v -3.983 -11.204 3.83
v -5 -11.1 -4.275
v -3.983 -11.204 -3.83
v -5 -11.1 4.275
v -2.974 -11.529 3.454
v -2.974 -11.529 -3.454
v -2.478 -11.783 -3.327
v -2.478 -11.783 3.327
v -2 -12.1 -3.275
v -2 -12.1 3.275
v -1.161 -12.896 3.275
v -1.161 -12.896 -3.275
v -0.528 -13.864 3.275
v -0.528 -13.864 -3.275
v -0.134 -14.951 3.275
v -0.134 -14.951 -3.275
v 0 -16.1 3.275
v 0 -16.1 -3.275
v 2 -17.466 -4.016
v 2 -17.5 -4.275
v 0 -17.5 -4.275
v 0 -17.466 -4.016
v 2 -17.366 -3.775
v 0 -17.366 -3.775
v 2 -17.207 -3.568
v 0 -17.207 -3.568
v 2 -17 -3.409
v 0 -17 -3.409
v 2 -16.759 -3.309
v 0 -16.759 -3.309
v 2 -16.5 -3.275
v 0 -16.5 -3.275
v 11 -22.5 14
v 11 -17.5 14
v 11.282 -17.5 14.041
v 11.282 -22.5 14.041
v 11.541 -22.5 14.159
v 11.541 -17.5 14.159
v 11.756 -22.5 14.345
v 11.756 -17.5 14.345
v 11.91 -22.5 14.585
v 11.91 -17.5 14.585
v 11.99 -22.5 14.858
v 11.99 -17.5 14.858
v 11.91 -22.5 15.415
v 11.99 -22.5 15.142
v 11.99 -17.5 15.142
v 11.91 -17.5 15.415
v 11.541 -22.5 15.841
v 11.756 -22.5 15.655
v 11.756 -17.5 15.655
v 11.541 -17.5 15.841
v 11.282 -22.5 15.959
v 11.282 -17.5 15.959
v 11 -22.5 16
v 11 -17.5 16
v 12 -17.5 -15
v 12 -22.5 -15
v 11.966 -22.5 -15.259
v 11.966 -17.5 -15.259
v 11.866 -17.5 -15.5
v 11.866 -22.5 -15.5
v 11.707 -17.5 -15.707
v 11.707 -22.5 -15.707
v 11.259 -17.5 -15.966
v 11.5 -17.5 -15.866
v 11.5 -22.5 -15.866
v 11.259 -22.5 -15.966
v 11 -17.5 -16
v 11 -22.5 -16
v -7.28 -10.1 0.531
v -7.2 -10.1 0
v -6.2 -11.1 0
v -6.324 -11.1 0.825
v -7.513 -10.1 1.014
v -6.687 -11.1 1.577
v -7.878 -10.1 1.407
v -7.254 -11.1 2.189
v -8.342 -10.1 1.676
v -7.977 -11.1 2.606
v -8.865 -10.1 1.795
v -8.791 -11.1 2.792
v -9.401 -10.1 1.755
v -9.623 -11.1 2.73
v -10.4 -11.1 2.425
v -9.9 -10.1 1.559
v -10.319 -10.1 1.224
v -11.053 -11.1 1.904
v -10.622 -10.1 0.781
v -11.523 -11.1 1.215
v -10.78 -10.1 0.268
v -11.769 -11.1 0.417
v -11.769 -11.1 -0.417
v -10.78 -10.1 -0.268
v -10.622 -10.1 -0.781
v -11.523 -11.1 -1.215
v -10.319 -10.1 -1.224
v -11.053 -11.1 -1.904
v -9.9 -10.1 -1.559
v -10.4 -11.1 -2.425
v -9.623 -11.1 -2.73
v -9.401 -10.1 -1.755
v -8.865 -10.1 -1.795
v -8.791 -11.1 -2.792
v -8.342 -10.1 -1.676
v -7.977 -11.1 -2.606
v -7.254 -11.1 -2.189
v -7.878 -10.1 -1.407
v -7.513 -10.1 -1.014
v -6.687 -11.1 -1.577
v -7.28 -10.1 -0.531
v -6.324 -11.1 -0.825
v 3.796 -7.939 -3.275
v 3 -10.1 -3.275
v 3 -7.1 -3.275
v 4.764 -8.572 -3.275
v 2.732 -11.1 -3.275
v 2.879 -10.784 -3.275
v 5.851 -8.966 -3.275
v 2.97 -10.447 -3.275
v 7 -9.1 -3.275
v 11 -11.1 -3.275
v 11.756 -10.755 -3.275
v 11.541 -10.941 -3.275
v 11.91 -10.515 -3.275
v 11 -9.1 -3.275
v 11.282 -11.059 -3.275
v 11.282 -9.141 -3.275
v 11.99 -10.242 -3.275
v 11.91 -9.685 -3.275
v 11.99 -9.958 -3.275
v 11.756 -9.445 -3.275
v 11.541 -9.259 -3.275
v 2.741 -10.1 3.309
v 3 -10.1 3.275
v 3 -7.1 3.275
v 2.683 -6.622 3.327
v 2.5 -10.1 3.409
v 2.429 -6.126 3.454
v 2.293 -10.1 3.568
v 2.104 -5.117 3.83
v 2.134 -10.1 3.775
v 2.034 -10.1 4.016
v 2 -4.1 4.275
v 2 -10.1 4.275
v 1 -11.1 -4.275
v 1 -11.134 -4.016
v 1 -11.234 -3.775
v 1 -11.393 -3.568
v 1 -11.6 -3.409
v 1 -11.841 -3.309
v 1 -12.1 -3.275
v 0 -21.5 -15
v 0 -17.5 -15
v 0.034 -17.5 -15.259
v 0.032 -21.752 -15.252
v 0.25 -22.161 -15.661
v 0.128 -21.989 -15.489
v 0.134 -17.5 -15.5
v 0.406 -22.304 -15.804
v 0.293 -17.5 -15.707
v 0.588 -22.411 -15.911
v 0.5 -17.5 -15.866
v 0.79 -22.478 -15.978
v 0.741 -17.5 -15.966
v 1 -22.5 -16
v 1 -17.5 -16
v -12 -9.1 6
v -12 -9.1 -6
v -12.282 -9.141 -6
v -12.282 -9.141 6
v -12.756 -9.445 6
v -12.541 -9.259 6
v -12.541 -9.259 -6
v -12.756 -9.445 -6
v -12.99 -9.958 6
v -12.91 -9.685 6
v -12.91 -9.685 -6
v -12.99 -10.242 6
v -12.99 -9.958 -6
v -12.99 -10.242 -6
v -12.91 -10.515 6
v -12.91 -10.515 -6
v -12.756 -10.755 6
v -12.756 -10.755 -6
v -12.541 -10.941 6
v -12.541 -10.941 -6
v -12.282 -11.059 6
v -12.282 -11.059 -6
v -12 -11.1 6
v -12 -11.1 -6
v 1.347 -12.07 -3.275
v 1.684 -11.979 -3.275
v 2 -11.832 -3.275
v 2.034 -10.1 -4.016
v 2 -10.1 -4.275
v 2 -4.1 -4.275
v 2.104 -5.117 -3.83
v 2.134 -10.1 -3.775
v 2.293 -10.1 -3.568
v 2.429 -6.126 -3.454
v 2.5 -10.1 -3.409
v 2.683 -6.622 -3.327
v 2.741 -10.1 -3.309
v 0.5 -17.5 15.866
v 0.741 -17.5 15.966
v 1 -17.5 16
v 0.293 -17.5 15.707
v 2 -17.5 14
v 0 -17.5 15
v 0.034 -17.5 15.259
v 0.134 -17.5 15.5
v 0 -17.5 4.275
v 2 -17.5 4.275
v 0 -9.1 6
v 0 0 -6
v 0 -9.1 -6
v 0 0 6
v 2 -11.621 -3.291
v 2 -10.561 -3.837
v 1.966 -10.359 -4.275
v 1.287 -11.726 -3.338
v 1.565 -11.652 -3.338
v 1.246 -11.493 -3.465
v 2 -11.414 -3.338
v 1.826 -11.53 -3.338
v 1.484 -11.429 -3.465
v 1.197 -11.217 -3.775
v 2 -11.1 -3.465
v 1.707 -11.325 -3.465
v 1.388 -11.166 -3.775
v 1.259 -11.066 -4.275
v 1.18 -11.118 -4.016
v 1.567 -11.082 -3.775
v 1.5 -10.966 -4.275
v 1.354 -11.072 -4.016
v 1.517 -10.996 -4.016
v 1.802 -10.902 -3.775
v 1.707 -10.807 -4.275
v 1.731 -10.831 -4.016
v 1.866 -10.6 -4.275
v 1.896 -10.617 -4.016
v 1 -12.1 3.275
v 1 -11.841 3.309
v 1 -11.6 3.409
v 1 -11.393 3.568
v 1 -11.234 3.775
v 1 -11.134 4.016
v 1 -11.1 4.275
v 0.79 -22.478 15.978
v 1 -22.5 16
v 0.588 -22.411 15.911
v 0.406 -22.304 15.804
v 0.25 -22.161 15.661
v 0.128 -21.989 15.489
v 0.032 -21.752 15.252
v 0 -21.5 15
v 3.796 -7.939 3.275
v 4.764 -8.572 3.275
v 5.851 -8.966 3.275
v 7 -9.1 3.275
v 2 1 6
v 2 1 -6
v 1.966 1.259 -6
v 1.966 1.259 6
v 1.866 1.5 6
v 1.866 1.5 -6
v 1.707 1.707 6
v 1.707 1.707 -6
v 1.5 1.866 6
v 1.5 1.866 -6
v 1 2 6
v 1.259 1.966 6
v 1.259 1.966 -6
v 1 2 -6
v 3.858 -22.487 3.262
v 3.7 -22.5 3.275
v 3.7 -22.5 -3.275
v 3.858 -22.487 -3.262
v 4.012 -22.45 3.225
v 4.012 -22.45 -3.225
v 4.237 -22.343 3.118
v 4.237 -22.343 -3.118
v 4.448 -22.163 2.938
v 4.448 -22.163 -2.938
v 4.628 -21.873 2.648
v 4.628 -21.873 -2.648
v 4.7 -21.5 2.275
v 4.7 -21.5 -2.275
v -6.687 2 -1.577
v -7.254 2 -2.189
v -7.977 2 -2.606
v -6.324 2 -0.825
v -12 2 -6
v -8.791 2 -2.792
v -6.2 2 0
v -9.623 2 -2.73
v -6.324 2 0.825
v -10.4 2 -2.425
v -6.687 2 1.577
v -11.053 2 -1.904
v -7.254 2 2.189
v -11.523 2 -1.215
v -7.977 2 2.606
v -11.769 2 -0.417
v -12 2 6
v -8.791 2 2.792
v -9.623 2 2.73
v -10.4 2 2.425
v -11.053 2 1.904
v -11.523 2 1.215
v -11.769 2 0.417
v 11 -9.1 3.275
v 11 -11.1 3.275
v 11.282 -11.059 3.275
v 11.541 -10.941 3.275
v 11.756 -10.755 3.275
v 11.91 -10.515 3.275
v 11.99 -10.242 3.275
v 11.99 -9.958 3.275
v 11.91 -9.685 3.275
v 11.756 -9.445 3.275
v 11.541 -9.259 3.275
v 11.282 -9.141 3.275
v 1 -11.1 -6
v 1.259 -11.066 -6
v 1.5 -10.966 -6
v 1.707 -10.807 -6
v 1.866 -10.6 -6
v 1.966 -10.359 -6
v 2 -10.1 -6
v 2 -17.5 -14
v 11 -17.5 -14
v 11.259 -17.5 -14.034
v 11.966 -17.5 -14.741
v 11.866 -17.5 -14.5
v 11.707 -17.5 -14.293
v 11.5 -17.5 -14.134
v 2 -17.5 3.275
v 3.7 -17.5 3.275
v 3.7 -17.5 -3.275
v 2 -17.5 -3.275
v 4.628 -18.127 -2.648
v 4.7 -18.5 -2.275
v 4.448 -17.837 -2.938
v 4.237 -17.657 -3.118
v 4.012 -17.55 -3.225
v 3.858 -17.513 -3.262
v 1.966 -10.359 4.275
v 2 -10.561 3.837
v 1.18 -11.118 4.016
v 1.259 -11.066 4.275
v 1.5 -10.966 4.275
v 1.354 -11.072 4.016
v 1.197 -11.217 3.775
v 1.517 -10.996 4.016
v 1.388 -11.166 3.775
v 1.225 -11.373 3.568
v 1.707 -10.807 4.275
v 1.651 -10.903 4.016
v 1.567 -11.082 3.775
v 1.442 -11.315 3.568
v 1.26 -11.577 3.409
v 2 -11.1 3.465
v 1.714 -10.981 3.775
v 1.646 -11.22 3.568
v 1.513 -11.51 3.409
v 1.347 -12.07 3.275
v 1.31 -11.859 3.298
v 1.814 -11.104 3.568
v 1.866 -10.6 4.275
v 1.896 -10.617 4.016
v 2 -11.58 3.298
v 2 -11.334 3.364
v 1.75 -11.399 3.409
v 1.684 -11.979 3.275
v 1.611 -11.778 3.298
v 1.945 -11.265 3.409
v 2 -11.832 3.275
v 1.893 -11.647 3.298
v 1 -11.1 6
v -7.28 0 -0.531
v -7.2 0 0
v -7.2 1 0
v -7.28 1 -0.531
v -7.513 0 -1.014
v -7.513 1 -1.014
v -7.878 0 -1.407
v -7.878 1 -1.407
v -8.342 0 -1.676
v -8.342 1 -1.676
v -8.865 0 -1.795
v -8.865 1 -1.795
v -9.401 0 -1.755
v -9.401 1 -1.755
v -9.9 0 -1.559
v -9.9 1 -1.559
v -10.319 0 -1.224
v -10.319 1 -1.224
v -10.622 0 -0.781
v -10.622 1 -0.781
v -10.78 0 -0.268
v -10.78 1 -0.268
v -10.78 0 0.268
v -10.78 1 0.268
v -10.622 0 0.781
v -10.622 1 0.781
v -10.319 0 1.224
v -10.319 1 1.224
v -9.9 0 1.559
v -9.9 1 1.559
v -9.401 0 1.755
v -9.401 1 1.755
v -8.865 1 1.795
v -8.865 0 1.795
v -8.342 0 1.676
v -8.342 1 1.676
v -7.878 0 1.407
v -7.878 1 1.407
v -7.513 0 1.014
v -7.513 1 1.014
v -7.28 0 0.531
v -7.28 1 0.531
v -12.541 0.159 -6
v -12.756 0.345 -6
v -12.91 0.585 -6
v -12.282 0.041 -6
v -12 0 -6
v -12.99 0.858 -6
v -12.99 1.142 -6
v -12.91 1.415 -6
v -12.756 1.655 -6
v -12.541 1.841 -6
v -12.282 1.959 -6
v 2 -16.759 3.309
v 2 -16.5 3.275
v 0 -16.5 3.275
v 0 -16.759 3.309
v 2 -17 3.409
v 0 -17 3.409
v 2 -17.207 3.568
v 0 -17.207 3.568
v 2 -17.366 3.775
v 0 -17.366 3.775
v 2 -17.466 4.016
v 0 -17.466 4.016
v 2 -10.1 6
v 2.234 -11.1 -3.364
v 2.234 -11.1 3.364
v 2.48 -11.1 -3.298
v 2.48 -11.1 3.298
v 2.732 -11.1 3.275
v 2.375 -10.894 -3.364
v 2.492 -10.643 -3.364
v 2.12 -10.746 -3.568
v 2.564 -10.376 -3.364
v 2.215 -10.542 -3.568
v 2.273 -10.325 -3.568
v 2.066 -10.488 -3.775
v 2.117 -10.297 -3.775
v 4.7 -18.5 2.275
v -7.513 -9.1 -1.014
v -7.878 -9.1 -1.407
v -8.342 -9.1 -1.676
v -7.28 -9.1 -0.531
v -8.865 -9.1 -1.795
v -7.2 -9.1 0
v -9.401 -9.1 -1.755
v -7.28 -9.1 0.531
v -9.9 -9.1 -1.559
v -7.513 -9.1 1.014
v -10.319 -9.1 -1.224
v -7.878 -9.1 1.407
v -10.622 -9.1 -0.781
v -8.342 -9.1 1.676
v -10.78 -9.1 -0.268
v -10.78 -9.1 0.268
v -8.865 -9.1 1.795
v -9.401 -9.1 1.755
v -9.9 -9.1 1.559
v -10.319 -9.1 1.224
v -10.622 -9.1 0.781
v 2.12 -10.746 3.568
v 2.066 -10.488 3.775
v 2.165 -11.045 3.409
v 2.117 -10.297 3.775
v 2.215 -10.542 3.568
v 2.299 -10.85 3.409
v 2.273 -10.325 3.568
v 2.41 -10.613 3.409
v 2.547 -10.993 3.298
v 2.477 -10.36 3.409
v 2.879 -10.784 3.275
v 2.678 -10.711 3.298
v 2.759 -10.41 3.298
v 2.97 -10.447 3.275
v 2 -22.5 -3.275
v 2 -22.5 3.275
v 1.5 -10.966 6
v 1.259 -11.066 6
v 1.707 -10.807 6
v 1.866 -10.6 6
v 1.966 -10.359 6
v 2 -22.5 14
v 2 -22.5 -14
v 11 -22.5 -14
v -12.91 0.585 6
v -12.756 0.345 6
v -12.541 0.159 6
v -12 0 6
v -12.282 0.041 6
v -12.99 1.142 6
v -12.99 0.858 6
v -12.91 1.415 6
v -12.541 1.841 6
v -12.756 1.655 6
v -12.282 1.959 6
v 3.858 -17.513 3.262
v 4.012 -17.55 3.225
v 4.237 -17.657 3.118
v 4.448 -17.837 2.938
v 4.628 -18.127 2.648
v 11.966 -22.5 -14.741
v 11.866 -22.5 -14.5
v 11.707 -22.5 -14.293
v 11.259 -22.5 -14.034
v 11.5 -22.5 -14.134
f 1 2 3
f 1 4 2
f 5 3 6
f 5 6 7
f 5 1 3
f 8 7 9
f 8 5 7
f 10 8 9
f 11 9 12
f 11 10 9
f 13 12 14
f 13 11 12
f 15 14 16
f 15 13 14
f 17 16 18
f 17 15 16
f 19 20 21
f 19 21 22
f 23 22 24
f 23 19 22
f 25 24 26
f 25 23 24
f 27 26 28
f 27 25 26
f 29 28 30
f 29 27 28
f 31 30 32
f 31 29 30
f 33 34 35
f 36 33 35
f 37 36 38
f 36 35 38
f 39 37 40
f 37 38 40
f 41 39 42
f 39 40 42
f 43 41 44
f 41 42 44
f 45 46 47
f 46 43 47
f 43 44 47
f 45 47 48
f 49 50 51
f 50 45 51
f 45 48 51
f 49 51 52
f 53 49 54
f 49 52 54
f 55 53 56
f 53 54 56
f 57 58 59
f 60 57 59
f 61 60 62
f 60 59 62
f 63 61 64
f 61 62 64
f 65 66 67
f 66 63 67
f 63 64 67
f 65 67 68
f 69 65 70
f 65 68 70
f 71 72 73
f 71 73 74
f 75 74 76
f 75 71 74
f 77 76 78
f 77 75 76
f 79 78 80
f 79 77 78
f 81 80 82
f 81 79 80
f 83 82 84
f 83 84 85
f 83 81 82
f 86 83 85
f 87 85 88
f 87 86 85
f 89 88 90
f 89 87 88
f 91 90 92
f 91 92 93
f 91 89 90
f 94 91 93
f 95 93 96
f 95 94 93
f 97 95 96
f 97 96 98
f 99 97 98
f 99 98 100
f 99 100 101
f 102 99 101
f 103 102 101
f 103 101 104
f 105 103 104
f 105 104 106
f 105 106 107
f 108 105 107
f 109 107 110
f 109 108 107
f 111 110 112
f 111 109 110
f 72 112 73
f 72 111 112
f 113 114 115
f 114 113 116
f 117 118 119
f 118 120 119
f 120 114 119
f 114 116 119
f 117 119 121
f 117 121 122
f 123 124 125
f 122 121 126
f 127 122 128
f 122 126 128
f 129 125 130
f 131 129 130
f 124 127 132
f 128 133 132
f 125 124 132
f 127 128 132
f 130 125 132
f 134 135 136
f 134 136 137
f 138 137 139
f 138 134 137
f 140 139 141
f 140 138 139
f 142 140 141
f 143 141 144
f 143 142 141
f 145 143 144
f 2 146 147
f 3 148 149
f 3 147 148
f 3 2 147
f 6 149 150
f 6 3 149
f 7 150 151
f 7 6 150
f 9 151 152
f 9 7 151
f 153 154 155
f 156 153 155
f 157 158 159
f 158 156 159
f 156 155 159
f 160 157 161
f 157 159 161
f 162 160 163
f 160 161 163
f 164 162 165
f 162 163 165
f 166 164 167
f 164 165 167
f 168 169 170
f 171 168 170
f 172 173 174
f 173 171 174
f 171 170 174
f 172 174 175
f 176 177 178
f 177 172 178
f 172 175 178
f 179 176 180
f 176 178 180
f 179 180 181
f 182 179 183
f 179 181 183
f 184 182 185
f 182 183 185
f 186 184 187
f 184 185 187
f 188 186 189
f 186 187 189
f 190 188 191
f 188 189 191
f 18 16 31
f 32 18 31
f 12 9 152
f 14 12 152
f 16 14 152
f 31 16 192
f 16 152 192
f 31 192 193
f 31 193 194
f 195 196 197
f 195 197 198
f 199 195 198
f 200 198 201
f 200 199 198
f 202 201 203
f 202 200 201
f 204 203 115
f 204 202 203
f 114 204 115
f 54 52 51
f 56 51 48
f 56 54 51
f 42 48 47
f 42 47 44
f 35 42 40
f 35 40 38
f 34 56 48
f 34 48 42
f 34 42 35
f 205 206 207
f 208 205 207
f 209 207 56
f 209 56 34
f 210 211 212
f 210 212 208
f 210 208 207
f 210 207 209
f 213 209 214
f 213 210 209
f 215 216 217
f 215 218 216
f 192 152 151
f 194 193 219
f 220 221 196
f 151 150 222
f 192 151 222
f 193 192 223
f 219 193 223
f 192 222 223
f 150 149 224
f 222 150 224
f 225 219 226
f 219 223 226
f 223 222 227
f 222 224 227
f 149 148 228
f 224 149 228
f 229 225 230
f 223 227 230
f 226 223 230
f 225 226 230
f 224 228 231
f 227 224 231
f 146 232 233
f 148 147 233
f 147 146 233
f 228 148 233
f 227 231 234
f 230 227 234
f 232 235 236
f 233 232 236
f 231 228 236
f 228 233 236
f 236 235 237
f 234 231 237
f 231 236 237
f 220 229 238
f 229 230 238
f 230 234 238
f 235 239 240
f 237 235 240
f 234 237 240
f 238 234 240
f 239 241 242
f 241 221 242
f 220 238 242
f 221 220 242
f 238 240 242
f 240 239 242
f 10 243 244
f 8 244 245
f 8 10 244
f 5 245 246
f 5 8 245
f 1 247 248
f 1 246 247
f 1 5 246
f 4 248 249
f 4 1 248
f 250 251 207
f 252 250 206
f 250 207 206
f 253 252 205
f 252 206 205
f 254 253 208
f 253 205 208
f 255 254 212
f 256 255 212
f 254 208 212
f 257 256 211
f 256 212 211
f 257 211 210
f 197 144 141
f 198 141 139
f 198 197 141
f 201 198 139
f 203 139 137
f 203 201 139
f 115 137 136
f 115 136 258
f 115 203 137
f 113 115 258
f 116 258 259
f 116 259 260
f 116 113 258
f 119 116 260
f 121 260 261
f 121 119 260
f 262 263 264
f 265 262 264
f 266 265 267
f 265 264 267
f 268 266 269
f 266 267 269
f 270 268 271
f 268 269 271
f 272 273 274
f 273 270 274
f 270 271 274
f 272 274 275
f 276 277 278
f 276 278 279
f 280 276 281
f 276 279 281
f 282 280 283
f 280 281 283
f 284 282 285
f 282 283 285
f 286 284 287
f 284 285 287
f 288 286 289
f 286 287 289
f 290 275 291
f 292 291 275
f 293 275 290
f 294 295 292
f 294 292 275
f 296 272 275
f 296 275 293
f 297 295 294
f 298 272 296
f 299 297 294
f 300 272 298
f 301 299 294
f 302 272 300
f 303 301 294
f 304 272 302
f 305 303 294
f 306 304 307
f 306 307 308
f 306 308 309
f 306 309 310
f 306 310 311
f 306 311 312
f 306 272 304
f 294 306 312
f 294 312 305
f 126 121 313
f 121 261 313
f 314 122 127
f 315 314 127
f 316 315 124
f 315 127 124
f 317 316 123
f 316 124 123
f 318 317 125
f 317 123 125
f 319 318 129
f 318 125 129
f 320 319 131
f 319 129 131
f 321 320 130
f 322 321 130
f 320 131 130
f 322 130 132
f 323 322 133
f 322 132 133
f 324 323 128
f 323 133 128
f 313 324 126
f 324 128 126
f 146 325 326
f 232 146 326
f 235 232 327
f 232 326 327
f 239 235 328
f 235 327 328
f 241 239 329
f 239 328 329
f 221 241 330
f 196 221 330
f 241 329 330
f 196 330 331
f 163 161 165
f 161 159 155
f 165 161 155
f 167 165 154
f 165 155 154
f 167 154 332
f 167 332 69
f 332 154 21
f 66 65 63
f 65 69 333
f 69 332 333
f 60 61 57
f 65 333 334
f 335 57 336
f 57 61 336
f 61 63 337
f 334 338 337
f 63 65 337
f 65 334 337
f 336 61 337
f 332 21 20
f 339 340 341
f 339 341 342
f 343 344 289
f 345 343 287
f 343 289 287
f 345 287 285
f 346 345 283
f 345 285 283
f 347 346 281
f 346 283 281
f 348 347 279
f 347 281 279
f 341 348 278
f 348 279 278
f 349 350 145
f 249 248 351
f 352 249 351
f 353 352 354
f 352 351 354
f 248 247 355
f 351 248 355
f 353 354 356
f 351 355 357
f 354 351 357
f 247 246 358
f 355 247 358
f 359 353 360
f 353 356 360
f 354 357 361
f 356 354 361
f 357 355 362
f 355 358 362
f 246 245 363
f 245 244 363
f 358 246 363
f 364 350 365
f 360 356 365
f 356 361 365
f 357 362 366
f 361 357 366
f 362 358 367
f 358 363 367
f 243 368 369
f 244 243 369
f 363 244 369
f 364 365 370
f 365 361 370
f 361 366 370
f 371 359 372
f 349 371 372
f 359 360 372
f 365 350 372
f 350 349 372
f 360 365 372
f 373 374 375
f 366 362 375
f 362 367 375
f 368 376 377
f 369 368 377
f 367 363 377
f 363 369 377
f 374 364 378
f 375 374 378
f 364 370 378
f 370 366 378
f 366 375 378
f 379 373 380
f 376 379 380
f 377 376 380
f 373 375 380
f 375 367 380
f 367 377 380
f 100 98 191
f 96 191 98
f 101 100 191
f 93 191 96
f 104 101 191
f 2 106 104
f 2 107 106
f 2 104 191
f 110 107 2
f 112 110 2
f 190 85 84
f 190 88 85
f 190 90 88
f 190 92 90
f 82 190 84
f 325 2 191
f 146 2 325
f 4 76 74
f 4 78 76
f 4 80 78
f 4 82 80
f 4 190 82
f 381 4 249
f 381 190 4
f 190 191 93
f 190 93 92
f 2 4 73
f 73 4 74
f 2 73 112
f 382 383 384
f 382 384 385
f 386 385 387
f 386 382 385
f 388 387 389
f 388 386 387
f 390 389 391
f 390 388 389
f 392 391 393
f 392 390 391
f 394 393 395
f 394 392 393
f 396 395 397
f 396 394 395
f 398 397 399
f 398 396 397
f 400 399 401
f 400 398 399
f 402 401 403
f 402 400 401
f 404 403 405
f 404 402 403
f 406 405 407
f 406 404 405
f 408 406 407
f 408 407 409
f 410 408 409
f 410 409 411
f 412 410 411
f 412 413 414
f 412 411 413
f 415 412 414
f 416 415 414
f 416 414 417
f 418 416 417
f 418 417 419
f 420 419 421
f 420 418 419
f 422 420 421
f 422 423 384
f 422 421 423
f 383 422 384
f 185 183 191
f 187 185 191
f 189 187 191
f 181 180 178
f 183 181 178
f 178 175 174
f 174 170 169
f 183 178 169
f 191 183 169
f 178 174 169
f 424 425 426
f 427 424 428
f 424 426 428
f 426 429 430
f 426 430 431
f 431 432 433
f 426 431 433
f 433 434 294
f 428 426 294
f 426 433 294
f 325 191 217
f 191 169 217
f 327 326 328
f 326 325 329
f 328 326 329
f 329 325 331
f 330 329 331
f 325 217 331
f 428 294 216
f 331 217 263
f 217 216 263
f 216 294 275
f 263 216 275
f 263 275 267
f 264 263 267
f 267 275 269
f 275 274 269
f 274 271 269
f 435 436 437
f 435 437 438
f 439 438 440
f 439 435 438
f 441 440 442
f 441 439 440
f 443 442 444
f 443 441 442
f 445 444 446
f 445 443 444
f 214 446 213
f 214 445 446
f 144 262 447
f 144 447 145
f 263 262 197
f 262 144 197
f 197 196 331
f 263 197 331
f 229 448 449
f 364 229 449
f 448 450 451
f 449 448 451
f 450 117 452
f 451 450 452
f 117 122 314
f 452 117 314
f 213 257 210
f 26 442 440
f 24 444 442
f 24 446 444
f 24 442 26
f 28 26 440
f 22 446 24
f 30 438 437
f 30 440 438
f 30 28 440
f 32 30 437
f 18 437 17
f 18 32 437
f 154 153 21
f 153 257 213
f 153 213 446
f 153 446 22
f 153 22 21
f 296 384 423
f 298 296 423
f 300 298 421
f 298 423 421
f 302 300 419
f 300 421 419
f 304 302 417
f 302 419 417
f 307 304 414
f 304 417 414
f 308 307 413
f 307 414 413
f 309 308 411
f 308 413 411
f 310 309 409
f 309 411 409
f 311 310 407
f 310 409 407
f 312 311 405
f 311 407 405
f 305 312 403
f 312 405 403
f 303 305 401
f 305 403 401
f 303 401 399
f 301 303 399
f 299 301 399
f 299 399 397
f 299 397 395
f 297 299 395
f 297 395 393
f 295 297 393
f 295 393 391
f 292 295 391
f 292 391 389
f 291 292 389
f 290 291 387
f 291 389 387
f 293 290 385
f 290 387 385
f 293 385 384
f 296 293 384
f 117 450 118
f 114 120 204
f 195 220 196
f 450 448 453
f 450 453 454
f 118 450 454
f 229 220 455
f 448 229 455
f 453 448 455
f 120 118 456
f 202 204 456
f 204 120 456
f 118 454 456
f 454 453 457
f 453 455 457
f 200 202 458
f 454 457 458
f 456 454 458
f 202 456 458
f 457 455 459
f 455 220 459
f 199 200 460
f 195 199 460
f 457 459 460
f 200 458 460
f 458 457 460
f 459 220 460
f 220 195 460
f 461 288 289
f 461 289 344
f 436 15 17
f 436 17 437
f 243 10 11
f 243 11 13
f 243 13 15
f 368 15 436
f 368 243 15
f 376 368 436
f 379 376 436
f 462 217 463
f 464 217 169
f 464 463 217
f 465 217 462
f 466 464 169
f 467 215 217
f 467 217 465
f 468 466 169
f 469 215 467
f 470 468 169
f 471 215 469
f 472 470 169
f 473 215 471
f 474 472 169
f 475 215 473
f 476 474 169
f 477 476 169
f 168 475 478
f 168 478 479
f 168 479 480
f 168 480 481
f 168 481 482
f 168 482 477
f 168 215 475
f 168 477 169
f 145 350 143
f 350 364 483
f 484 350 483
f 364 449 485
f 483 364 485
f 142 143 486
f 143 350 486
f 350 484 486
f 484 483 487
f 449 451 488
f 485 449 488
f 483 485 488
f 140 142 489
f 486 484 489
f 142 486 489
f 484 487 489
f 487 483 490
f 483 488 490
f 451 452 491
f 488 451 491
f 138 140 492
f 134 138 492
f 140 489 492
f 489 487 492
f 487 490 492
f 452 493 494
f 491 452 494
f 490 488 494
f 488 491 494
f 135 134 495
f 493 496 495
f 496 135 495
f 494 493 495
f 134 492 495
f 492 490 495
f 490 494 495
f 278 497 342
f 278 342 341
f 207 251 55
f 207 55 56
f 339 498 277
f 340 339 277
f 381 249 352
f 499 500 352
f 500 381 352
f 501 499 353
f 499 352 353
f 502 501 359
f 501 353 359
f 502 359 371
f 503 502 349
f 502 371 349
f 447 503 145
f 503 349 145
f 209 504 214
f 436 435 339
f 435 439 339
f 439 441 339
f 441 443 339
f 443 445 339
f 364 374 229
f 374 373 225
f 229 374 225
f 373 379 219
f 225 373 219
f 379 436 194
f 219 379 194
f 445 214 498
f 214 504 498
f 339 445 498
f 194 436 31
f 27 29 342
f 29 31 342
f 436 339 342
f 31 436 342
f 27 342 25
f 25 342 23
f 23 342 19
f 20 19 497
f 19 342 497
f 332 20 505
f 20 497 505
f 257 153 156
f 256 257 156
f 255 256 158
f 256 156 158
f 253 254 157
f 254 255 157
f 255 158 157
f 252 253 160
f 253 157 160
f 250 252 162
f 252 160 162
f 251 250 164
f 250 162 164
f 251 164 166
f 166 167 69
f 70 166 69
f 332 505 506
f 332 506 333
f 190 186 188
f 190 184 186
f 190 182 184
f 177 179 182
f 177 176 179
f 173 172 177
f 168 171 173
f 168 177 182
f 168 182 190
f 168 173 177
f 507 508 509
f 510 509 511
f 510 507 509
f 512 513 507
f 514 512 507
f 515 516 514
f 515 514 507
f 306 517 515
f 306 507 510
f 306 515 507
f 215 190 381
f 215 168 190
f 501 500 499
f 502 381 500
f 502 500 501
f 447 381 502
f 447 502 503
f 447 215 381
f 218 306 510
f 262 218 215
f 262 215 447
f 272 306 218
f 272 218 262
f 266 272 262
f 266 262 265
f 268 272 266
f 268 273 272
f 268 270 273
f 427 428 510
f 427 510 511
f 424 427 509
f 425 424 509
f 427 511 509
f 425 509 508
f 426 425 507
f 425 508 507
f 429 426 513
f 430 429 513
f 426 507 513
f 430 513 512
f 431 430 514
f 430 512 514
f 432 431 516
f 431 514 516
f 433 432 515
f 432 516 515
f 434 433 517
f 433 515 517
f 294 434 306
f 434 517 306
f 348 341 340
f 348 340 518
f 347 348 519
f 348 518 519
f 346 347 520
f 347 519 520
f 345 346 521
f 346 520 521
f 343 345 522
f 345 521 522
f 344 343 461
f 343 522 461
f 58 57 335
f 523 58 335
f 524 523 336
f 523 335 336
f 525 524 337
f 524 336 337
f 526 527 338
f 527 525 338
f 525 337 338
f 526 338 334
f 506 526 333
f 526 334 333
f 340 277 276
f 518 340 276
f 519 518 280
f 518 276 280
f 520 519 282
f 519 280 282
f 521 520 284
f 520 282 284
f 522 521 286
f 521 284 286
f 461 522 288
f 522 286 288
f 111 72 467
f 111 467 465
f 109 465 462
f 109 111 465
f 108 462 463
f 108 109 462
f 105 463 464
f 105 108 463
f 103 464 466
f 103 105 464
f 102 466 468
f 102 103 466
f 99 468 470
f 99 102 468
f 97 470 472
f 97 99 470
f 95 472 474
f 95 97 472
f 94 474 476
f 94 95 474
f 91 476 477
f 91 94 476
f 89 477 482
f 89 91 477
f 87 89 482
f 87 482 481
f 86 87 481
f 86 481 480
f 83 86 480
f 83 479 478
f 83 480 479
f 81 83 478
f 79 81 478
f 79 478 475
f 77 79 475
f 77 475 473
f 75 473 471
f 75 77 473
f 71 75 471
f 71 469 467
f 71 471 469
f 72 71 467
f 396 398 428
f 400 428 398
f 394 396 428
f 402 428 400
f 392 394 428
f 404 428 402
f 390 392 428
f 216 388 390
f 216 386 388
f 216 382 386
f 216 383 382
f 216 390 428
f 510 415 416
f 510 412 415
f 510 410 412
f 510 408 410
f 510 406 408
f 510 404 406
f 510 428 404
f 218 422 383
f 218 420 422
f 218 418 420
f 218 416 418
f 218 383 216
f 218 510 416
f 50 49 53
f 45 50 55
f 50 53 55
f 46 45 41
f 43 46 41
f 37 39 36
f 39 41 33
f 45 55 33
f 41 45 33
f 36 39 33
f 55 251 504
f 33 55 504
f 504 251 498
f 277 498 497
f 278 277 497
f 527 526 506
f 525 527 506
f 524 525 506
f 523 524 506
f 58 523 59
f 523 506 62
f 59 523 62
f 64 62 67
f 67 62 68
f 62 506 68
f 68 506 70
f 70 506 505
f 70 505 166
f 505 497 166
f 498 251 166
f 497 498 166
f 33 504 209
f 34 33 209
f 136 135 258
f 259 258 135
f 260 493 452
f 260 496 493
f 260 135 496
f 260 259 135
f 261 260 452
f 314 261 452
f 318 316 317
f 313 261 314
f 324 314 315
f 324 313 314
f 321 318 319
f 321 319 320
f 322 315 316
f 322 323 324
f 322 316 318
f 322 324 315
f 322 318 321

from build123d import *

# Parameters (mm, degrees)
SKETCH1_W               = 10
SKETCH1_H               = 2
BOSS_EXTRUDE1_DEPTH     = 3.275
BOSS_EXTRUDE2_DEPTH     = 6
SKETCH3_W               = 2
SKETCH3_H               = 5
BOSS_EXTRUDE3_DEPTH     = 16
SKETCH4_W               = 2
SKETCH4_H               = 5
BOSS_EXTRUDE4_DEPTH     = 10
FILLET1_R               = 1
FILLET2_R               = 1
CUT_EXTRUDE1_DEPTH      = 33.01952537
CUT_EXTRUDE1_DEPTH_BACK = 33.01952537
SKETCH2_R               = 1.8
CHAMFER1_SIZE           = 1
FILLET3_R               = 5


with BuildPart() as part:
    # Sketch1 → Boss-Extrude1 (new, symmetric)
    with BuildSketch(Plane.XY):
        Polygon((0, -9.1), (-13, -9.1), (-13, -11.1), (2, -11.1), (2, 2), (-13, 2), (-13, 0), (0, 0), align=None)
        Polygon((2, -11.1), (0, -11.1), (0, -22.5), (4.7, -22.5), (4.7, -17.5), (2, -17.5), align=None)
        with Locations((7, -10.1)):
            Rectangle(SKETCH1_W, SKETCH1_H)
    extrude(amount=BOSS_EXTRUDE1_DEPTH, both=True)

    # Sketch1<3> → Boss-Extrude2 (add, symmetric)
    with BuildSketch(Plane.XY):
        Polygon((0, -9.1), (-13, -9.1), (-13, -11.1), (2, -11.1), (2, 2), (-13, 2), (-13, 0), (0, 0), align=None)
    extrude(amount=BOSS_EXTRUDE2_DEPTH, both=True)

    # Sketch3 → Boss-Extrude3 (add, symmetric)
    with BuildSketch(Plane.XY):
        with Locations((1, -20)):
            Rectangle(SKETCH3_W, SKETCH3_H)
    extrude(amount=BOSS_EXTRUDE3_DEPTH, both=True)

    # Sketch4 → Boss-Extrude4 (add)
    with BuildSketch(Plane(origin=(2, 0, 0), x_dir=(0, 0, -1), z_dir=(1, 0, 0))):
        with Locations((-15, -20)):
            Rectangle(SKETCH4_W, SKETCH4_H)
        with Locations((15, -20)):
            Rectangle(SKETCH4_W, SKETCH4_H)
    extrude(amount=BOSS_EXTRUDE4_DEPTH)

    # Fillet1
    # the kernel refuses this fillet: 1 mm, written as the material it adds along each edge
    with BuildSketch(Plane(origin=(2, -17.5, 3.275), x_dir=(0, 1, 0), z_dir=(-1, 0, 0)), Plane(origin=(2, -17.5, -3.275), x_dir=(0, 0, -1), z_dir=(-1, 0, 0))) as fillet1_piece_1:
        with BuildLine():
            CenterArc((FILLET1_R, -FILLET1_R), FILLET1_R, 90, 90)
            Line((0, -FILLET1_R), (0, 0))
            Line((0, 0), (FILLET1_R, 0))
        make_face()
    extrude(amount=2)
    # the kernel refuses this fillet: 1 mm, written as the material it takes off along each edge
    with BuildSketch(Plane(origin=(-13, -9.1, -8.5), x_dir=(1, 0, 0), z_dir=(0, 0, 1)), Plane(origin=(-13, -11.1, -8.5), x_dir=(0, 1, 0), z_dir=(0, 0, 1)), Plane(origin=(2, 2, -8.5), x_dir=(0, -1, 0), z_dir=(0, 0, 1)), Plane(origin=(-13, 2, -8.5), x_dir=(1, 0, 0), z_dir=(0, 0, 1))) as fillet1_2_piece_1:
        with BuildLine():
            CenterArc((FILLET1_R, -FILLET1_R), FILLET1_R, 90, 90)
            Line((0, -FILLET1_R), (0, 0))
            Line((0, 0), (FILLET1_R, 0))
        make_face()
    extrude(amount=17, mode=Mode.SUBTRACT)
    with BuildSketch(Plane(origin=(2, -11.1, -8.5), x_dir=(-1, 0, 0), z_dir=(0, 0, 1)), Plane(origin=(2, -11.1, 3.275), x_dir=(-1, 0, 0), z_dir=(0, 0, 1))) as fillet1_2_piece_2:
        with BuildLine():
            CenterArc((FILLET1_R, -FILLET1_R), FILLET1_R, 90, 90)
            Line((0, -FILLET1_R), (0, 0))
            Line((0, 0), (FILLET1_R, 0))
        make_face()
    extrude(amount=5.225, mode=Mode.SUBTRACT)
    with BuildSketch(Plane(origin=(12, -15, 14), x_dir=(-1, 0, 0), z_dir=(0, -1, 0)), Plane(origin=(12, -15, -14), x_dir=(0, 0, -1), z_dir=(0, -1, 0)), Plane(origin=(0, -15, -16), x_dir=(0, 0, 1), z_dir=(0, -1, 0)), Plane(origin=(12, -25, 16), x_dir=(-1, 0, 0), z_dir=(0, 1, 0))) as fillet1_2_piece_3:
        with BuildLine():
            CenterArc((FILLET1_R, -FILLET1_R), FILLET1_R, 90, 90)
            Line((0, -FILLET1_R), (0, 0))
            Line((0, 0), (FILLET1_R, 0))
        make_face()
    extrude(amount=10, mode=Mode.SUBTRACT)
    with BuildSketch(Plane(origin=(0, -22.5, -18.5), x_dir=(0, 1, 0), z_dir=(0, 0, 1))) as fillet1_2_piece_4:
        with BuildLine():
            CenterArc((FILLET1_R, -FILLET1_R), FILLET1_R, 90, 90)
            Line((0, -FILLET1_R), (0, 0))
            Line((0, 0), (FILLET1_R, 0))
        make_face()
    extrude(amount=37, mode=Mode.SUBTRACT)
    with BuildSketch(Plane(origin=(4.7, -22.5, -5.775), x_dir=(-1, 0, 0), z_dir=(0, 0, 1)), Plane(origin=(4.7, -17.5, 5.775), x_dir=(-1, 0, 0), z_dir=(0, 0, -1))) as fillet1_2_piece_5:
        with BuildLine():
            CenterArc((FILLET1_R, -FILLET1_R), FILLET1_R, 90, 90)
            Line((0, -FILLET1_R), (0, 0))
            Line((0, 0), (FILLET1_R, 0))
        make_face()
    extrude(amount=11.55, mode=Mode.SUBTRACT)
    with BuildSketch(Plane(origin=(4.7, -25, 3.275), x_dir=(0, 0, -1), z_dir=(0, 1, 0)), Plane(origin=(4.7, -25, -3.275), x_dir=(-1, 0, 0), z_dir=(0, 1, 0)), Plane(origin=(12, -25, -16), x_dir=(-1, 0, 0), z_dir=(0, 1, 0)), Plane(origin=(0, -15, 16), x_dir=(0, 0, -1), z_dir=(0, -1, 0))) as fillet1_2_piece_6:
        with BuildLine():
            CenterArc((FILLET1_R, FILLET1_R), FILLET1_R, 180, 90)
            Line((0, FILLET1_R), (0, 0))
            Line((0, 0), (FILLET1_R, 0))
        make_face()
    extrude(amount=10, mode=Mode.SUBTRACT)
    with BuildSketch(Plane(origin=(12, -11.1, -5.775), x_dir=(0, 1, 0), z_dir=(0, 0, 1)), Plane(origin=(12, -9.1, -5.775), x_dir=(-1, 0, 0), z_dir=(0, 0, 1))) as fillet1_2_piece_7:
        with BuildLine():
            CenterArc((FILLET1_R, FILLET1_R), FILLET1_R, 180, 90)
            Line((0, FILLET1_R), (0, 0))
            Line((0, 0), (FILLET1_R, 0))
        make_face()
    extrude(amount=11.55, mode=Mode.SUBTRACT)
    with BuildSketch(Plane(origin=(-13, 0, 8.5), x_dir=(0, 1, 0), z_dir=(0, 0, -1))) as fillet1_2_piece_8:
        with BuildLine():
            CenterArc((FILLET1_R, FILLET1_R), FILLET1_R, 180, 90)
            Line((0, FILLET1_R), (0, 0))
            Line((0, 0), (FILLET1_R, 0))
        make_face()
    extrude(amount=17, mode=Mode.SUBTRACT)

    # Fillet2
    # the kernel refuses this fillet: 1 mm, written as the material it adds along each edge
    with BuildSketch(Plane(origin=(1, -10.1, -3.275), x_dir=(0, -1, 0), z_dir=(-1, 0, 0))) as fillet2_piece_1_section:
        with BuildLine():
            CenterArc((1 + FILLET2_R, -FILLET2_R), FILLET2_R, 90, 90)
            Line((1, -FILLET2_R), (1, 0))
            Line((1, 0), (1 + FILLET2_R, 0))
        make_face()
    fillet2_piece_1 = revolve(axis=Axis((1, -10.1, -3.275), (0, 0, 1)), revolution_arc=90, mode=Mode.PRIVATE)
    fillet2_piece_1 = split(fillet2_piece_1, bisect_by=Plane(origin=(2, -11.34730941, -3.421981112), z_dir=(-1, 0, 0)), keep=Keep.TOP, mode=Mode.PRIVATE)
    fillet2_piece_1 = split(fillet2_piece_1, bisect_by=Plane(origin=(1.400007142, -11.1, -3.421981112), z_dir=(0, -1, 0)), keep=Keep.TOP, mode=Mode.PRIVATE)
    add(fillet2_piece_1)
    with BuildSketch(Plane(origin=(1, -10.1, -3.275), x_dir=(0, -1, 0), z_dir=(-1, 0, 0))) as fillet2_piece_2_section:
        with BuildLine():
            CenterArc((1 + FILLET2_R, -FILLET2_R), FILLET2_R, 90, 90)
            Line((1, -FILLET2_R), (1, 0))
            Line((1, 0), (1 + FILLET2_R, 0))
        make_face()
    fillet2_piece_2 = revolve(axis=Axis((1, -10.1, -3.275), (0, 0, 1)), revolution_arc=90, mode=Mode.PRIVATE)
    fillet2_piece_2 = split(fillet2_piece_2, bisect_by=Plane(origin=(2, -10.826426326, -3.613950845), z_dir=(-1, 0, 0)), keep=Keep.TOP, mode=Mode.PRIVATE)
    fillet2_piece_2 = split(fillet2_piece_2, bisect_by=Plane(origin=(1.726426326, -11.1, -3.613950845), z_dir=(0, 1, 0)), keep=Keep.TOP, mode=Mode.PRIVATE)
    add(fillet2_piece_2)
    with BuildSketch(Plane(origin=(1, -10.1, -3.275), x_dir=(0, -1, 0), z_dir=(-1, 0, 0))) as fillet2_piece_3_section:
        with BuildLine():
            CenterArc((1 + FILLET2_R, -FILLET2_R), FILLET2_R, 90, 90)
            Line((1, -FILLET2_R), (1, 0))
            Line((1, 0), (1 + FILLET2_R, 0))
        make_face()
    fillet2_piece_3 = revolve(axis=Axis((1, -10.1, -3.275), (0, 0, 1)), revolution_arc=90, mode=Mode.PRIVATE)
    fillet2_piece_3 = split(fillet2_piece_3, bisect_by=Plane(origin=(2, -10.500007075, -3.421981186), z_dir=(1, 0, 0)), keep=Keep.TOP, mode=Mode.PRIVATE)
    fillet2_piece_3 = split(fillet2_piece_3, bisect_by=Plane(origin=(2.24730905, -11.1, -3.421981186), z_dir=(0, 1, 0)), keep=Keep.TOP, mode=Mode.PRIVATE)
    add(fillet2_piece_3)
    with BuildSketch(Plane(origin=(1, -10.1, 3.275), x_dir=(0, -1, 0), z_dir=(-1, 0, 0))) as fillet2_piece_4_section:
        with BuildLine():
            CenterArc((1 + FILLET2_R, FILLET2_R), FILLET2_R, 180, 90)
            Line((1, FILLET2_R), (1, 0))
            Line((1, 0), (1 + FILLET2_R, 0))
        make_face()
    fillet2_piece_4 = revolve(axis=Axis((1, -10.1, 3.275), (0, 0, 1)), revolution_arc=90, mode=Mode.PRIVATE)
    fillet2_piece_4 = split(fillet2_piece_4, bisect_by=Plane(origin=(2, -11.34730941, 3.421981112), z_dir=(-1, 0, 0)), keep=Keep.TOP, mode=Mode.PRIVATE)
    fillet2_piece_4 = split(fillet2_piece_4, bisect_by=Plane(origin=(1.400007142, -11.1, 3.421981112), z_dir=(0, -1, 0)), keep=Keep.TOP, mode=Mode.PRIVATE)
    add(fillet2_piece_4)
    with BuildSketch(Plane(origin=(1, -10.1, 3.275), x_dir=(0, -1, 0), z_dir=(-1, 0, 0))) as fillet2_piece_5_section:
        with BuildLine():
            CenterArc((1 + FILLET2_R, FILLET2_R), FILLET2_R, 180, 90)
            Line((1, FILLET2_R), (1, 0))
            Line((1, 0), (1 + FILLET2_R, 0))
        make_face()
    fillet2_piece_5 = revolve(axis=Axis((1, -10.1, 3.275), (0, 0, 1)), revolution_arc=90, mode=Mode.PRIVATE)
    fillet2_piece_5 = split(fillet2_piece_5, bisect_by=Plane(origin=(2, -10.826426326, 3.613950845), z_dir=(-1, 0, 0)), keep=Keep.TOP, mode=Mode.PRIVATE)
    fillet2_piece_5 = split(fillet2_piece_5, bisect_by=Plane(origin=(1.726426326, -11.1, 3.613950845), z_dir=(0, 1, 0)), keep=Keep.TOP, mode=Mode.PRIVATE)
    add(fillet2_piece_5)
    with BuildSketch(Plane(origin=(1, -10.1, 3.275), x_dir=(0, -1, 0), z_dir=(-1, 0, 0))) as fillet2_piece_6_section:
        with BuildLine():
            CenterArc((1 + FILLET2_R, FILLET2_R), FILLET2_R, 180, 90)
            Line((1, FILLET2_R), (1, 0))
            Line((1, 0), (1 + FILLET2_R, 0))
        make_face()
    fillet2_piece_6 = revolve(axis=Axis((1, -10.1, 3.275), (0, 0, 1)), revolution_arc=90, mode=Mode.PRIVATE)
    fillet2_piece_6 = split(fillet2_piece_6, bisect_by=Plane(origin=(2, -10.500007075, 3.421981186), z_dir=(1, 0, 0)), keep=Keep.TOP, mode=Mode.PRIVATE)
    fillet2_piece_6 = split(fillet2_piece_6, bisect_by=Plane(origin=(2.24730905, -11.1, 3.421981186), z_dir=(0, 1, 0)), keep=Keep.TOP, mode=Mode.PRIVATE)
    add(fillet2_piece_6)
    with BuildSketch(Plane(origin=(0, -11.1, 3.275), x_dir=(0, -1, 0), z_dir=(1, 0, 0)), Plane(origin=(2, -10.1, 3.275), x_dir=(1, 0, 0), z_dir=(0, 1, 0)), Plane(origin=(0, -11.1, -3.275), x_dir=(0, 0, -1), z_dir=(1, 0, 0)), Plane(origin=(2, -10.1, -3.275), x_dir=(0, 0, -1), z_dir=(0, 1, 0))) as fillet2_piece_7:
        with BuildLine():
            CenterArc((FILLET2_R, -FILLET2_R), FILLET2_R, 90, 90)
            Line((0, -FILLET2_R), (0, 0))
            Line((0, 0), (FILLET2_R, 0))
        make_face()
    extrude(amount=1)

    # Sketch2 → Cut-Extrude1 (cut, two sides: drawn at the far end of the back side and taken through both)
    with BuildSketch(Plane(origin=(0, 2, 0), x_dir=(1, 0, 0), z_dir=(0, 1, 0)).offset(-CUT_EXTRUDE1_DEPTH_BACK)):
        with Locations((-9, 0)):
            Circle(SKETCH2_R)
    extrude(amount=CUT_EXTRUDE1_DEPTH + CUT_EXTRUDE1_DEPTH_BACK, mode=Mode.SUBTRACT)

    # Chamfer1
    chamfer1_edges = [part.edges().sort_by_distance(p)[0] for p in [
        (-10.8, -11.1, 0),
        (-10.8, 2, 0),
    ]]
    chamfer(chamfer1_edges, length=CHAMFER1_SIZE)

    # Fillet3
    fillet3_edges = [part.edges().sort_by_distance(p)[0] for p in [
        (0, -11.1, 0),
        (2, -9.1, 0),
    ]]
    fillet(fillet3_edges, radius=FILLET3_R)


solid = part.part
